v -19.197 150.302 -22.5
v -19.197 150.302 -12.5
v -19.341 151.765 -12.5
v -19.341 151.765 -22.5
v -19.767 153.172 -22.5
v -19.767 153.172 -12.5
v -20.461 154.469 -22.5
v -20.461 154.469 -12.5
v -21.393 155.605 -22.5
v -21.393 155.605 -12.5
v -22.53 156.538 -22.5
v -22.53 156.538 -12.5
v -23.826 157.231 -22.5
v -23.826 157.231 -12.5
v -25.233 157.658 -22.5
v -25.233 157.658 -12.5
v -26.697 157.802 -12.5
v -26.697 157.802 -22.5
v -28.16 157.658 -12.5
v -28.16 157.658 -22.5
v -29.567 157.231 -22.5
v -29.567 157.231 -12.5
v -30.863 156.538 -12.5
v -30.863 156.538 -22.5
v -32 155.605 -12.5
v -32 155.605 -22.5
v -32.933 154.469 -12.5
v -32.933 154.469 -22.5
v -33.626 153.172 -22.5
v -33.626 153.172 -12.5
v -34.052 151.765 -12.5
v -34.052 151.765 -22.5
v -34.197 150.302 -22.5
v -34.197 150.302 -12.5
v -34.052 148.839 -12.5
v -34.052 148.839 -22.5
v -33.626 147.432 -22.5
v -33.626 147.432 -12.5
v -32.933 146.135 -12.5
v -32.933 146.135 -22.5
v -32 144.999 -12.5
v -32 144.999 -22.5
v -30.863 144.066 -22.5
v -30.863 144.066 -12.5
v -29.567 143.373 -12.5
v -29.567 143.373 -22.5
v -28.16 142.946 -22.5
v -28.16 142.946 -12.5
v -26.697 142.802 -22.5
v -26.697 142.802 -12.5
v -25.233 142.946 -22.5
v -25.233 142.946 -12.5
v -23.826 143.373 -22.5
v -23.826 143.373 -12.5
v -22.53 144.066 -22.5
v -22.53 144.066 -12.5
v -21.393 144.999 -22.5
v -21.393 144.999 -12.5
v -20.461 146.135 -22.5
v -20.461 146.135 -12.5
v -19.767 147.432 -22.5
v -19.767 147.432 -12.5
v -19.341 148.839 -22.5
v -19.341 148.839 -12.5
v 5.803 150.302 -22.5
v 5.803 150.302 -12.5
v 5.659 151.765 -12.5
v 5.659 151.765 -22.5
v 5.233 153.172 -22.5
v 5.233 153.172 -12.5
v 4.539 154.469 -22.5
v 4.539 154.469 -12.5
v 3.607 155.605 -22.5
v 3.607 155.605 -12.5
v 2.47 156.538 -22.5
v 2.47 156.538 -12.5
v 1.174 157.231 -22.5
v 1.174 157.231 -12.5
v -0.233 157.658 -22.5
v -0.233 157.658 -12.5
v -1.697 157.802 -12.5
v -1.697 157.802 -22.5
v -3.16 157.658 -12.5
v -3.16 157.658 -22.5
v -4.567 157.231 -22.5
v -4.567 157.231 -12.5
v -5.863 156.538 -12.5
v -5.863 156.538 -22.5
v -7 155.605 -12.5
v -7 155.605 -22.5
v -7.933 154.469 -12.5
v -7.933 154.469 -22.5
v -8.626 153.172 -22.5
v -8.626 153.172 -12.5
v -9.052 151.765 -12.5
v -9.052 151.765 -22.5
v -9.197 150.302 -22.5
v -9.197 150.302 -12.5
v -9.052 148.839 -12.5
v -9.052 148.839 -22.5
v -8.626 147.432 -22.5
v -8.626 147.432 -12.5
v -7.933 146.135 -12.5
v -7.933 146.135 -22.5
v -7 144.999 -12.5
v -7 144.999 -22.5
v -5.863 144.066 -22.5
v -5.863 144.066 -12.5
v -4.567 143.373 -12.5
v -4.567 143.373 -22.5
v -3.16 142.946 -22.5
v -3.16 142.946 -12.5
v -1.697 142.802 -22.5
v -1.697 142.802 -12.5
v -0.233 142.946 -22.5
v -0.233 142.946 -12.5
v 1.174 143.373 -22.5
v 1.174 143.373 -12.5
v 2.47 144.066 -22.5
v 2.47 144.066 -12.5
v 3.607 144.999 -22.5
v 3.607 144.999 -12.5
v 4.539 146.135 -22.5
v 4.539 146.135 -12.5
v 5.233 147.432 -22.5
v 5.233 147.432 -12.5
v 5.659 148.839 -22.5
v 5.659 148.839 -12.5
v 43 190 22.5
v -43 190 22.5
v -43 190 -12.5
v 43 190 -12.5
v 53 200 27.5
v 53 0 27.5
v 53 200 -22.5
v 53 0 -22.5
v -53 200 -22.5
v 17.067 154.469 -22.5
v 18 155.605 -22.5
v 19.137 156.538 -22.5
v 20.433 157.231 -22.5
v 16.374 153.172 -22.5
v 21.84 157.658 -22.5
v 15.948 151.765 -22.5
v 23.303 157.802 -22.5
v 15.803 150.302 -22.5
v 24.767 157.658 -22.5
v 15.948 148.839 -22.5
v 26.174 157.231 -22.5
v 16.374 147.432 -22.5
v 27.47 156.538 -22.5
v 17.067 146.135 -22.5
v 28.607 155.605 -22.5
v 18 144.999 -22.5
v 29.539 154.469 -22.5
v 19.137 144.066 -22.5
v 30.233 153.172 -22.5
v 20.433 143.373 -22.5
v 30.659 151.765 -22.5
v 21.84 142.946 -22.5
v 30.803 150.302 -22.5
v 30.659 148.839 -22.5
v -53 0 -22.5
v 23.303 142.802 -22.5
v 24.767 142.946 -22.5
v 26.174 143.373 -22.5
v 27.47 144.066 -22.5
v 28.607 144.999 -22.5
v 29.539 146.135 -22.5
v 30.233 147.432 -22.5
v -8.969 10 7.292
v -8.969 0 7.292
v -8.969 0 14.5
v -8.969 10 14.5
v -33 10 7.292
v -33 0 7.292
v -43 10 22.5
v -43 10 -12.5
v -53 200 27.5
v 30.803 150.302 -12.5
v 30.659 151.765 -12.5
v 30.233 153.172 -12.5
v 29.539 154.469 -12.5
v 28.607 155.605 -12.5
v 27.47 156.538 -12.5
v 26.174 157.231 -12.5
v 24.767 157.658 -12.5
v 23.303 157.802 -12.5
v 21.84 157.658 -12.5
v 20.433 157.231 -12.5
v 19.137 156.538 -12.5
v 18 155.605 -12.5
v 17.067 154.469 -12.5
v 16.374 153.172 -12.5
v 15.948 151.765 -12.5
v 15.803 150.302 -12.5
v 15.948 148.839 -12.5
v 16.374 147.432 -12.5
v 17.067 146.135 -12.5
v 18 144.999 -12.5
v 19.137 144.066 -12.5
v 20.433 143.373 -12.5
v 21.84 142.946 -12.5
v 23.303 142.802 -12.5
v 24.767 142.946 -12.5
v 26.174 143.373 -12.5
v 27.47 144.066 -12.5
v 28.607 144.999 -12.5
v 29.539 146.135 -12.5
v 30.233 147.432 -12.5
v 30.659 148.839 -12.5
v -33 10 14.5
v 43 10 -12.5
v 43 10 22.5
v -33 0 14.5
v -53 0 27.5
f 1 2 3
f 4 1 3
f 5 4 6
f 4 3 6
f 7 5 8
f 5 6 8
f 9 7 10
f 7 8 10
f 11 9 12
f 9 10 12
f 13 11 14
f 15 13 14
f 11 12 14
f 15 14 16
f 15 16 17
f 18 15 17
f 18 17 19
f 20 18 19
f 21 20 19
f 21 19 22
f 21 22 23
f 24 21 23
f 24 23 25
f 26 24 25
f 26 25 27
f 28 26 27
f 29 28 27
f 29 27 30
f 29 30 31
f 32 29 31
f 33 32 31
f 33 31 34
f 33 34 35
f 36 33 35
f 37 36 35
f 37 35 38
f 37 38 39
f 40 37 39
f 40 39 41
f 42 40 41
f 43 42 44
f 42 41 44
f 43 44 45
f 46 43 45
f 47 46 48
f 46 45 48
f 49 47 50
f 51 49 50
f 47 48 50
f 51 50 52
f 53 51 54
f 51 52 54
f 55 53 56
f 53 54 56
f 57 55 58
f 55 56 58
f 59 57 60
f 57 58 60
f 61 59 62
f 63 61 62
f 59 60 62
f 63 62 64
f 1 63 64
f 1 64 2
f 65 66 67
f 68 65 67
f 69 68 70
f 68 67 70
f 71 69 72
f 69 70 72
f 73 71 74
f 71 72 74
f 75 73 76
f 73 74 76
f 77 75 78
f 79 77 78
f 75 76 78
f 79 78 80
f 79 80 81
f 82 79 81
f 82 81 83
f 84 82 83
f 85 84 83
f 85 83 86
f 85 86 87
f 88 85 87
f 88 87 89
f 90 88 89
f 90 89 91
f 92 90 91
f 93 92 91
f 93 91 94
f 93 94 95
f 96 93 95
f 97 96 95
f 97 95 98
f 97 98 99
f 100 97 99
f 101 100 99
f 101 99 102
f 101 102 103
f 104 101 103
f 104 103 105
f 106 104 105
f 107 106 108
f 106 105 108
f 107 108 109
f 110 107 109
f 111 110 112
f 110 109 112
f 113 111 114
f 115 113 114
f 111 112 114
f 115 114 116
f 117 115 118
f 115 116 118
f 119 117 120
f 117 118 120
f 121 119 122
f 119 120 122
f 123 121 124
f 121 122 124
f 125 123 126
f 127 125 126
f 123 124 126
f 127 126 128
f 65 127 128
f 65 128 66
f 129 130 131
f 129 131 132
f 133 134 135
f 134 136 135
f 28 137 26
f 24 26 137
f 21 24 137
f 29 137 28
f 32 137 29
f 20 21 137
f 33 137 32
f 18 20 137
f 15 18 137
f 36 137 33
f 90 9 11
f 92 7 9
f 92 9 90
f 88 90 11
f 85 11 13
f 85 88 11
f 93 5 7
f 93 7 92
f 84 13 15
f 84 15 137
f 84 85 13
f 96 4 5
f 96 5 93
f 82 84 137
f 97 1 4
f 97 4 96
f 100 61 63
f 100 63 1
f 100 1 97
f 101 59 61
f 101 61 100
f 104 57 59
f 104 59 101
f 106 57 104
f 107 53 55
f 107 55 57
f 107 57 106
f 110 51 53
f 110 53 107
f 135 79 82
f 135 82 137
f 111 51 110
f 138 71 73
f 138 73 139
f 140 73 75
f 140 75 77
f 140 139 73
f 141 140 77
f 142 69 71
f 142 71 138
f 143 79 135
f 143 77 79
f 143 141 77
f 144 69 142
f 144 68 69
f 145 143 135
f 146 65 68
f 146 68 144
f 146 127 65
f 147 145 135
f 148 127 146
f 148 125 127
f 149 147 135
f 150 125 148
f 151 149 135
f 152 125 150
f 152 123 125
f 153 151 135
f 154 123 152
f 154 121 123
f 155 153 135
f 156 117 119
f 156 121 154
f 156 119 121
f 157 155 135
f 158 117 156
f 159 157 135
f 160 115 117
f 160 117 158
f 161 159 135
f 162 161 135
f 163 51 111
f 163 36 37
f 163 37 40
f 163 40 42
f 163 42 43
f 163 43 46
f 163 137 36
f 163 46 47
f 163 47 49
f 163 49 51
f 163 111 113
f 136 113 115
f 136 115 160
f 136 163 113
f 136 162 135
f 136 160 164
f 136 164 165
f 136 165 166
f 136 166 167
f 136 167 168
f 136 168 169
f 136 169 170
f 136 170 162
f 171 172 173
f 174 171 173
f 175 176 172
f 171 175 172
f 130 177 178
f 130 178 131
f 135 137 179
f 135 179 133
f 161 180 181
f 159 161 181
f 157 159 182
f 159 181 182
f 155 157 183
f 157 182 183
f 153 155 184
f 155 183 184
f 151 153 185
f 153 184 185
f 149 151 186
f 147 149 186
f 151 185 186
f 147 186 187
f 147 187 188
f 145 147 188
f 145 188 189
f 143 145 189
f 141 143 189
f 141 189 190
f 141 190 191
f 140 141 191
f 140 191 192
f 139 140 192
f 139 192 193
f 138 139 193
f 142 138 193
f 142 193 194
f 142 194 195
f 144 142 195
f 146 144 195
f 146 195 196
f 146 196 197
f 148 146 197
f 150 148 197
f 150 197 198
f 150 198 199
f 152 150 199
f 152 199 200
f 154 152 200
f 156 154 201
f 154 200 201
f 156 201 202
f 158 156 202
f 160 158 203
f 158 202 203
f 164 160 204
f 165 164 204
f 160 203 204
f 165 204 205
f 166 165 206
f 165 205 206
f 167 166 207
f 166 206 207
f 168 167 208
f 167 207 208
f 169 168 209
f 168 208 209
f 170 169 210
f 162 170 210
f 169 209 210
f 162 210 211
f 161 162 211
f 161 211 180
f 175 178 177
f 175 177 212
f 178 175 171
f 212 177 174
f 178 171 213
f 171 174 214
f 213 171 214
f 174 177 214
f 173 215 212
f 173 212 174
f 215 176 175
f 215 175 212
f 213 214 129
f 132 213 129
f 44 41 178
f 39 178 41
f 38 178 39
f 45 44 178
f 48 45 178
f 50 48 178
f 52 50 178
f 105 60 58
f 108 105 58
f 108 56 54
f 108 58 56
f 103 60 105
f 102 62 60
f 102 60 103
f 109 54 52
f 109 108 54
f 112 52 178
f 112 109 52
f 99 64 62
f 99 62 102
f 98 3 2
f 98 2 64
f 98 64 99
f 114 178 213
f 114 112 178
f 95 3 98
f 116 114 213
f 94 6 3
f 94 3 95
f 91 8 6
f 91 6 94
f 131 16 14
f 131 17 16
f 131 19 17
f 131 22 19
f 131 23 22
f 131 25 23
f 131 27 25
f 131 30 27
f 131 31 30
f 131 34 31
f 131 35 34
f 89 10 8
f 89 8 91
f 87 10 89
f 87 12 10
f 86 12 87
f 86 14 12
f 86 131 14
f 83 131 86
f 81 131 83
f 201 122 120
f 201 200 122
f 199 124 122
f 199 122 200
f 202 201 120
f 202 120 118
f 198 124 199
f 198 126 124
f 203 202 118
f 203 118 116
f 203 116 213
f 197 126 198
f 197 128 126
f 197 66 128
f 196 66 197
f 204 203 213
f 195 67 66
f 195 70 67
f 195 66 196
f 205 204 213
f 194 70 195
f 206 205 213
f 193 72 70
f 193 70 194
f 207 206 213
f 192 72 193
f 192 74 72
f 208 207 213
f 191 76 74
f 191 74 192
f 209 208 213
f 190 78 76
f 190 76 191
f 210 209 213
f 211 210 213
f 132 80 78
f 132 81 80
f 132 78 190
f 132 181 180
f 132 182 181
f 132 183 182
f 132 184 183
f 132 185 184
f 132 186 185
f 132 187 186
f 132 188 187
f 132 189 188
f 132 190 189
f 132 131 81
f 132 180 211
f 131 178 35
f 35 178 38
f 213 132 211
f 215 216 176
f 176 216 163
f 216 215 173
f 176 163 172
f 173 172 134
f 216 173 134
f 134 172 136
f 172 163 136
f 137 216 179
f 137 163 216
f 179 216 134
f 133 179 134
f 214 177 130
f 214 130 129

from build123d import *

# Parameters (mm, degrees)
SKETCH_1_W          = 106
SKETCH_1_H          = 45
EXTRUDE_1_DEPTH     = 200
SKETCH_2_W          = 86
SKETCH_2_H          = 180
CUT_EXTRUDE_1_DEPTH = 35
SKETCH_3_R          = 7.5
CUT_EXTRUDE_2_DEPTH = 210.842798304
SKETCH_4_W          = 24.030592061
SKETCH_4_H          = 7.207958271
CUT_EXTRUDE_4_DEPTH = 35
SKETCH_5_W          = 106
SKETCH_5_H          = 200
EXTRUDE_2_DEPTH     = 5


with BuildPart() as part:
    # 草圖1 → 填料-伸長1 (new body)
    with BuildSketch(Plane(origin=(0, 0, 0), x_dir=(1, 0, 0), z_dir=(0, 1, 0))):
        Rectangle(SKETCH_1_W, SKETCH_1_H)
    extrude(amount=EXTRUDE_1_DEPTH)

    # 草圖2 → 除料-伸長1 (cut)
    with BuildSketch(Plane.XY.offset(22.5)):
        with Locations((0, 100)):
            Rectangle(SKETCH_2_W, SKETCH_2_H)
    extrude(amount=-CUT_EXTRUDE_1_DEPTH, mode=Mode.SUBTRACT)

    # 草圖3 → 除料-伸長2 (cut, through all)
    with BuildSketch(Plane.XY.offset(-12.5)):
        with Locations((-26.696570332, 150.301958836)):
            Circle(SKETCH_3_R)
        with Locations((-1.696570332, 150.301958836)):
            Circle(SKETCH_3_R)
        with Locations((23.303429668, 150.301958836)):
            Circle(SKETCH_3_R)
    extrude(amount=-CUT_EXTRUDE_2_DEPTH, mode=Mode.SUBTRACT)

    # 草圖4 → 除料-伸長4 (cut)
    with BuildSketch(Plane.XZ):
        with Locations((-20.984703969, 10.896020865)):
            Rectangle(SKETCH_4_W, SKETCH_4_H)
    extrude(amount=-CUT_EXTRUDE_4_DEPTH, mode=Mode.SUBTRACT)

    # 草圖5 → 填料-伸長2 (add)
    with BuildSketch(Plane.XY.offset(22.5)):
        with Locations((0, 100)):
            Rectangle(SKETCH_5_W, SKETCH_5_H)
    extrude(amount=EXTRUDE_2_DEPTH)


solid = part.part
